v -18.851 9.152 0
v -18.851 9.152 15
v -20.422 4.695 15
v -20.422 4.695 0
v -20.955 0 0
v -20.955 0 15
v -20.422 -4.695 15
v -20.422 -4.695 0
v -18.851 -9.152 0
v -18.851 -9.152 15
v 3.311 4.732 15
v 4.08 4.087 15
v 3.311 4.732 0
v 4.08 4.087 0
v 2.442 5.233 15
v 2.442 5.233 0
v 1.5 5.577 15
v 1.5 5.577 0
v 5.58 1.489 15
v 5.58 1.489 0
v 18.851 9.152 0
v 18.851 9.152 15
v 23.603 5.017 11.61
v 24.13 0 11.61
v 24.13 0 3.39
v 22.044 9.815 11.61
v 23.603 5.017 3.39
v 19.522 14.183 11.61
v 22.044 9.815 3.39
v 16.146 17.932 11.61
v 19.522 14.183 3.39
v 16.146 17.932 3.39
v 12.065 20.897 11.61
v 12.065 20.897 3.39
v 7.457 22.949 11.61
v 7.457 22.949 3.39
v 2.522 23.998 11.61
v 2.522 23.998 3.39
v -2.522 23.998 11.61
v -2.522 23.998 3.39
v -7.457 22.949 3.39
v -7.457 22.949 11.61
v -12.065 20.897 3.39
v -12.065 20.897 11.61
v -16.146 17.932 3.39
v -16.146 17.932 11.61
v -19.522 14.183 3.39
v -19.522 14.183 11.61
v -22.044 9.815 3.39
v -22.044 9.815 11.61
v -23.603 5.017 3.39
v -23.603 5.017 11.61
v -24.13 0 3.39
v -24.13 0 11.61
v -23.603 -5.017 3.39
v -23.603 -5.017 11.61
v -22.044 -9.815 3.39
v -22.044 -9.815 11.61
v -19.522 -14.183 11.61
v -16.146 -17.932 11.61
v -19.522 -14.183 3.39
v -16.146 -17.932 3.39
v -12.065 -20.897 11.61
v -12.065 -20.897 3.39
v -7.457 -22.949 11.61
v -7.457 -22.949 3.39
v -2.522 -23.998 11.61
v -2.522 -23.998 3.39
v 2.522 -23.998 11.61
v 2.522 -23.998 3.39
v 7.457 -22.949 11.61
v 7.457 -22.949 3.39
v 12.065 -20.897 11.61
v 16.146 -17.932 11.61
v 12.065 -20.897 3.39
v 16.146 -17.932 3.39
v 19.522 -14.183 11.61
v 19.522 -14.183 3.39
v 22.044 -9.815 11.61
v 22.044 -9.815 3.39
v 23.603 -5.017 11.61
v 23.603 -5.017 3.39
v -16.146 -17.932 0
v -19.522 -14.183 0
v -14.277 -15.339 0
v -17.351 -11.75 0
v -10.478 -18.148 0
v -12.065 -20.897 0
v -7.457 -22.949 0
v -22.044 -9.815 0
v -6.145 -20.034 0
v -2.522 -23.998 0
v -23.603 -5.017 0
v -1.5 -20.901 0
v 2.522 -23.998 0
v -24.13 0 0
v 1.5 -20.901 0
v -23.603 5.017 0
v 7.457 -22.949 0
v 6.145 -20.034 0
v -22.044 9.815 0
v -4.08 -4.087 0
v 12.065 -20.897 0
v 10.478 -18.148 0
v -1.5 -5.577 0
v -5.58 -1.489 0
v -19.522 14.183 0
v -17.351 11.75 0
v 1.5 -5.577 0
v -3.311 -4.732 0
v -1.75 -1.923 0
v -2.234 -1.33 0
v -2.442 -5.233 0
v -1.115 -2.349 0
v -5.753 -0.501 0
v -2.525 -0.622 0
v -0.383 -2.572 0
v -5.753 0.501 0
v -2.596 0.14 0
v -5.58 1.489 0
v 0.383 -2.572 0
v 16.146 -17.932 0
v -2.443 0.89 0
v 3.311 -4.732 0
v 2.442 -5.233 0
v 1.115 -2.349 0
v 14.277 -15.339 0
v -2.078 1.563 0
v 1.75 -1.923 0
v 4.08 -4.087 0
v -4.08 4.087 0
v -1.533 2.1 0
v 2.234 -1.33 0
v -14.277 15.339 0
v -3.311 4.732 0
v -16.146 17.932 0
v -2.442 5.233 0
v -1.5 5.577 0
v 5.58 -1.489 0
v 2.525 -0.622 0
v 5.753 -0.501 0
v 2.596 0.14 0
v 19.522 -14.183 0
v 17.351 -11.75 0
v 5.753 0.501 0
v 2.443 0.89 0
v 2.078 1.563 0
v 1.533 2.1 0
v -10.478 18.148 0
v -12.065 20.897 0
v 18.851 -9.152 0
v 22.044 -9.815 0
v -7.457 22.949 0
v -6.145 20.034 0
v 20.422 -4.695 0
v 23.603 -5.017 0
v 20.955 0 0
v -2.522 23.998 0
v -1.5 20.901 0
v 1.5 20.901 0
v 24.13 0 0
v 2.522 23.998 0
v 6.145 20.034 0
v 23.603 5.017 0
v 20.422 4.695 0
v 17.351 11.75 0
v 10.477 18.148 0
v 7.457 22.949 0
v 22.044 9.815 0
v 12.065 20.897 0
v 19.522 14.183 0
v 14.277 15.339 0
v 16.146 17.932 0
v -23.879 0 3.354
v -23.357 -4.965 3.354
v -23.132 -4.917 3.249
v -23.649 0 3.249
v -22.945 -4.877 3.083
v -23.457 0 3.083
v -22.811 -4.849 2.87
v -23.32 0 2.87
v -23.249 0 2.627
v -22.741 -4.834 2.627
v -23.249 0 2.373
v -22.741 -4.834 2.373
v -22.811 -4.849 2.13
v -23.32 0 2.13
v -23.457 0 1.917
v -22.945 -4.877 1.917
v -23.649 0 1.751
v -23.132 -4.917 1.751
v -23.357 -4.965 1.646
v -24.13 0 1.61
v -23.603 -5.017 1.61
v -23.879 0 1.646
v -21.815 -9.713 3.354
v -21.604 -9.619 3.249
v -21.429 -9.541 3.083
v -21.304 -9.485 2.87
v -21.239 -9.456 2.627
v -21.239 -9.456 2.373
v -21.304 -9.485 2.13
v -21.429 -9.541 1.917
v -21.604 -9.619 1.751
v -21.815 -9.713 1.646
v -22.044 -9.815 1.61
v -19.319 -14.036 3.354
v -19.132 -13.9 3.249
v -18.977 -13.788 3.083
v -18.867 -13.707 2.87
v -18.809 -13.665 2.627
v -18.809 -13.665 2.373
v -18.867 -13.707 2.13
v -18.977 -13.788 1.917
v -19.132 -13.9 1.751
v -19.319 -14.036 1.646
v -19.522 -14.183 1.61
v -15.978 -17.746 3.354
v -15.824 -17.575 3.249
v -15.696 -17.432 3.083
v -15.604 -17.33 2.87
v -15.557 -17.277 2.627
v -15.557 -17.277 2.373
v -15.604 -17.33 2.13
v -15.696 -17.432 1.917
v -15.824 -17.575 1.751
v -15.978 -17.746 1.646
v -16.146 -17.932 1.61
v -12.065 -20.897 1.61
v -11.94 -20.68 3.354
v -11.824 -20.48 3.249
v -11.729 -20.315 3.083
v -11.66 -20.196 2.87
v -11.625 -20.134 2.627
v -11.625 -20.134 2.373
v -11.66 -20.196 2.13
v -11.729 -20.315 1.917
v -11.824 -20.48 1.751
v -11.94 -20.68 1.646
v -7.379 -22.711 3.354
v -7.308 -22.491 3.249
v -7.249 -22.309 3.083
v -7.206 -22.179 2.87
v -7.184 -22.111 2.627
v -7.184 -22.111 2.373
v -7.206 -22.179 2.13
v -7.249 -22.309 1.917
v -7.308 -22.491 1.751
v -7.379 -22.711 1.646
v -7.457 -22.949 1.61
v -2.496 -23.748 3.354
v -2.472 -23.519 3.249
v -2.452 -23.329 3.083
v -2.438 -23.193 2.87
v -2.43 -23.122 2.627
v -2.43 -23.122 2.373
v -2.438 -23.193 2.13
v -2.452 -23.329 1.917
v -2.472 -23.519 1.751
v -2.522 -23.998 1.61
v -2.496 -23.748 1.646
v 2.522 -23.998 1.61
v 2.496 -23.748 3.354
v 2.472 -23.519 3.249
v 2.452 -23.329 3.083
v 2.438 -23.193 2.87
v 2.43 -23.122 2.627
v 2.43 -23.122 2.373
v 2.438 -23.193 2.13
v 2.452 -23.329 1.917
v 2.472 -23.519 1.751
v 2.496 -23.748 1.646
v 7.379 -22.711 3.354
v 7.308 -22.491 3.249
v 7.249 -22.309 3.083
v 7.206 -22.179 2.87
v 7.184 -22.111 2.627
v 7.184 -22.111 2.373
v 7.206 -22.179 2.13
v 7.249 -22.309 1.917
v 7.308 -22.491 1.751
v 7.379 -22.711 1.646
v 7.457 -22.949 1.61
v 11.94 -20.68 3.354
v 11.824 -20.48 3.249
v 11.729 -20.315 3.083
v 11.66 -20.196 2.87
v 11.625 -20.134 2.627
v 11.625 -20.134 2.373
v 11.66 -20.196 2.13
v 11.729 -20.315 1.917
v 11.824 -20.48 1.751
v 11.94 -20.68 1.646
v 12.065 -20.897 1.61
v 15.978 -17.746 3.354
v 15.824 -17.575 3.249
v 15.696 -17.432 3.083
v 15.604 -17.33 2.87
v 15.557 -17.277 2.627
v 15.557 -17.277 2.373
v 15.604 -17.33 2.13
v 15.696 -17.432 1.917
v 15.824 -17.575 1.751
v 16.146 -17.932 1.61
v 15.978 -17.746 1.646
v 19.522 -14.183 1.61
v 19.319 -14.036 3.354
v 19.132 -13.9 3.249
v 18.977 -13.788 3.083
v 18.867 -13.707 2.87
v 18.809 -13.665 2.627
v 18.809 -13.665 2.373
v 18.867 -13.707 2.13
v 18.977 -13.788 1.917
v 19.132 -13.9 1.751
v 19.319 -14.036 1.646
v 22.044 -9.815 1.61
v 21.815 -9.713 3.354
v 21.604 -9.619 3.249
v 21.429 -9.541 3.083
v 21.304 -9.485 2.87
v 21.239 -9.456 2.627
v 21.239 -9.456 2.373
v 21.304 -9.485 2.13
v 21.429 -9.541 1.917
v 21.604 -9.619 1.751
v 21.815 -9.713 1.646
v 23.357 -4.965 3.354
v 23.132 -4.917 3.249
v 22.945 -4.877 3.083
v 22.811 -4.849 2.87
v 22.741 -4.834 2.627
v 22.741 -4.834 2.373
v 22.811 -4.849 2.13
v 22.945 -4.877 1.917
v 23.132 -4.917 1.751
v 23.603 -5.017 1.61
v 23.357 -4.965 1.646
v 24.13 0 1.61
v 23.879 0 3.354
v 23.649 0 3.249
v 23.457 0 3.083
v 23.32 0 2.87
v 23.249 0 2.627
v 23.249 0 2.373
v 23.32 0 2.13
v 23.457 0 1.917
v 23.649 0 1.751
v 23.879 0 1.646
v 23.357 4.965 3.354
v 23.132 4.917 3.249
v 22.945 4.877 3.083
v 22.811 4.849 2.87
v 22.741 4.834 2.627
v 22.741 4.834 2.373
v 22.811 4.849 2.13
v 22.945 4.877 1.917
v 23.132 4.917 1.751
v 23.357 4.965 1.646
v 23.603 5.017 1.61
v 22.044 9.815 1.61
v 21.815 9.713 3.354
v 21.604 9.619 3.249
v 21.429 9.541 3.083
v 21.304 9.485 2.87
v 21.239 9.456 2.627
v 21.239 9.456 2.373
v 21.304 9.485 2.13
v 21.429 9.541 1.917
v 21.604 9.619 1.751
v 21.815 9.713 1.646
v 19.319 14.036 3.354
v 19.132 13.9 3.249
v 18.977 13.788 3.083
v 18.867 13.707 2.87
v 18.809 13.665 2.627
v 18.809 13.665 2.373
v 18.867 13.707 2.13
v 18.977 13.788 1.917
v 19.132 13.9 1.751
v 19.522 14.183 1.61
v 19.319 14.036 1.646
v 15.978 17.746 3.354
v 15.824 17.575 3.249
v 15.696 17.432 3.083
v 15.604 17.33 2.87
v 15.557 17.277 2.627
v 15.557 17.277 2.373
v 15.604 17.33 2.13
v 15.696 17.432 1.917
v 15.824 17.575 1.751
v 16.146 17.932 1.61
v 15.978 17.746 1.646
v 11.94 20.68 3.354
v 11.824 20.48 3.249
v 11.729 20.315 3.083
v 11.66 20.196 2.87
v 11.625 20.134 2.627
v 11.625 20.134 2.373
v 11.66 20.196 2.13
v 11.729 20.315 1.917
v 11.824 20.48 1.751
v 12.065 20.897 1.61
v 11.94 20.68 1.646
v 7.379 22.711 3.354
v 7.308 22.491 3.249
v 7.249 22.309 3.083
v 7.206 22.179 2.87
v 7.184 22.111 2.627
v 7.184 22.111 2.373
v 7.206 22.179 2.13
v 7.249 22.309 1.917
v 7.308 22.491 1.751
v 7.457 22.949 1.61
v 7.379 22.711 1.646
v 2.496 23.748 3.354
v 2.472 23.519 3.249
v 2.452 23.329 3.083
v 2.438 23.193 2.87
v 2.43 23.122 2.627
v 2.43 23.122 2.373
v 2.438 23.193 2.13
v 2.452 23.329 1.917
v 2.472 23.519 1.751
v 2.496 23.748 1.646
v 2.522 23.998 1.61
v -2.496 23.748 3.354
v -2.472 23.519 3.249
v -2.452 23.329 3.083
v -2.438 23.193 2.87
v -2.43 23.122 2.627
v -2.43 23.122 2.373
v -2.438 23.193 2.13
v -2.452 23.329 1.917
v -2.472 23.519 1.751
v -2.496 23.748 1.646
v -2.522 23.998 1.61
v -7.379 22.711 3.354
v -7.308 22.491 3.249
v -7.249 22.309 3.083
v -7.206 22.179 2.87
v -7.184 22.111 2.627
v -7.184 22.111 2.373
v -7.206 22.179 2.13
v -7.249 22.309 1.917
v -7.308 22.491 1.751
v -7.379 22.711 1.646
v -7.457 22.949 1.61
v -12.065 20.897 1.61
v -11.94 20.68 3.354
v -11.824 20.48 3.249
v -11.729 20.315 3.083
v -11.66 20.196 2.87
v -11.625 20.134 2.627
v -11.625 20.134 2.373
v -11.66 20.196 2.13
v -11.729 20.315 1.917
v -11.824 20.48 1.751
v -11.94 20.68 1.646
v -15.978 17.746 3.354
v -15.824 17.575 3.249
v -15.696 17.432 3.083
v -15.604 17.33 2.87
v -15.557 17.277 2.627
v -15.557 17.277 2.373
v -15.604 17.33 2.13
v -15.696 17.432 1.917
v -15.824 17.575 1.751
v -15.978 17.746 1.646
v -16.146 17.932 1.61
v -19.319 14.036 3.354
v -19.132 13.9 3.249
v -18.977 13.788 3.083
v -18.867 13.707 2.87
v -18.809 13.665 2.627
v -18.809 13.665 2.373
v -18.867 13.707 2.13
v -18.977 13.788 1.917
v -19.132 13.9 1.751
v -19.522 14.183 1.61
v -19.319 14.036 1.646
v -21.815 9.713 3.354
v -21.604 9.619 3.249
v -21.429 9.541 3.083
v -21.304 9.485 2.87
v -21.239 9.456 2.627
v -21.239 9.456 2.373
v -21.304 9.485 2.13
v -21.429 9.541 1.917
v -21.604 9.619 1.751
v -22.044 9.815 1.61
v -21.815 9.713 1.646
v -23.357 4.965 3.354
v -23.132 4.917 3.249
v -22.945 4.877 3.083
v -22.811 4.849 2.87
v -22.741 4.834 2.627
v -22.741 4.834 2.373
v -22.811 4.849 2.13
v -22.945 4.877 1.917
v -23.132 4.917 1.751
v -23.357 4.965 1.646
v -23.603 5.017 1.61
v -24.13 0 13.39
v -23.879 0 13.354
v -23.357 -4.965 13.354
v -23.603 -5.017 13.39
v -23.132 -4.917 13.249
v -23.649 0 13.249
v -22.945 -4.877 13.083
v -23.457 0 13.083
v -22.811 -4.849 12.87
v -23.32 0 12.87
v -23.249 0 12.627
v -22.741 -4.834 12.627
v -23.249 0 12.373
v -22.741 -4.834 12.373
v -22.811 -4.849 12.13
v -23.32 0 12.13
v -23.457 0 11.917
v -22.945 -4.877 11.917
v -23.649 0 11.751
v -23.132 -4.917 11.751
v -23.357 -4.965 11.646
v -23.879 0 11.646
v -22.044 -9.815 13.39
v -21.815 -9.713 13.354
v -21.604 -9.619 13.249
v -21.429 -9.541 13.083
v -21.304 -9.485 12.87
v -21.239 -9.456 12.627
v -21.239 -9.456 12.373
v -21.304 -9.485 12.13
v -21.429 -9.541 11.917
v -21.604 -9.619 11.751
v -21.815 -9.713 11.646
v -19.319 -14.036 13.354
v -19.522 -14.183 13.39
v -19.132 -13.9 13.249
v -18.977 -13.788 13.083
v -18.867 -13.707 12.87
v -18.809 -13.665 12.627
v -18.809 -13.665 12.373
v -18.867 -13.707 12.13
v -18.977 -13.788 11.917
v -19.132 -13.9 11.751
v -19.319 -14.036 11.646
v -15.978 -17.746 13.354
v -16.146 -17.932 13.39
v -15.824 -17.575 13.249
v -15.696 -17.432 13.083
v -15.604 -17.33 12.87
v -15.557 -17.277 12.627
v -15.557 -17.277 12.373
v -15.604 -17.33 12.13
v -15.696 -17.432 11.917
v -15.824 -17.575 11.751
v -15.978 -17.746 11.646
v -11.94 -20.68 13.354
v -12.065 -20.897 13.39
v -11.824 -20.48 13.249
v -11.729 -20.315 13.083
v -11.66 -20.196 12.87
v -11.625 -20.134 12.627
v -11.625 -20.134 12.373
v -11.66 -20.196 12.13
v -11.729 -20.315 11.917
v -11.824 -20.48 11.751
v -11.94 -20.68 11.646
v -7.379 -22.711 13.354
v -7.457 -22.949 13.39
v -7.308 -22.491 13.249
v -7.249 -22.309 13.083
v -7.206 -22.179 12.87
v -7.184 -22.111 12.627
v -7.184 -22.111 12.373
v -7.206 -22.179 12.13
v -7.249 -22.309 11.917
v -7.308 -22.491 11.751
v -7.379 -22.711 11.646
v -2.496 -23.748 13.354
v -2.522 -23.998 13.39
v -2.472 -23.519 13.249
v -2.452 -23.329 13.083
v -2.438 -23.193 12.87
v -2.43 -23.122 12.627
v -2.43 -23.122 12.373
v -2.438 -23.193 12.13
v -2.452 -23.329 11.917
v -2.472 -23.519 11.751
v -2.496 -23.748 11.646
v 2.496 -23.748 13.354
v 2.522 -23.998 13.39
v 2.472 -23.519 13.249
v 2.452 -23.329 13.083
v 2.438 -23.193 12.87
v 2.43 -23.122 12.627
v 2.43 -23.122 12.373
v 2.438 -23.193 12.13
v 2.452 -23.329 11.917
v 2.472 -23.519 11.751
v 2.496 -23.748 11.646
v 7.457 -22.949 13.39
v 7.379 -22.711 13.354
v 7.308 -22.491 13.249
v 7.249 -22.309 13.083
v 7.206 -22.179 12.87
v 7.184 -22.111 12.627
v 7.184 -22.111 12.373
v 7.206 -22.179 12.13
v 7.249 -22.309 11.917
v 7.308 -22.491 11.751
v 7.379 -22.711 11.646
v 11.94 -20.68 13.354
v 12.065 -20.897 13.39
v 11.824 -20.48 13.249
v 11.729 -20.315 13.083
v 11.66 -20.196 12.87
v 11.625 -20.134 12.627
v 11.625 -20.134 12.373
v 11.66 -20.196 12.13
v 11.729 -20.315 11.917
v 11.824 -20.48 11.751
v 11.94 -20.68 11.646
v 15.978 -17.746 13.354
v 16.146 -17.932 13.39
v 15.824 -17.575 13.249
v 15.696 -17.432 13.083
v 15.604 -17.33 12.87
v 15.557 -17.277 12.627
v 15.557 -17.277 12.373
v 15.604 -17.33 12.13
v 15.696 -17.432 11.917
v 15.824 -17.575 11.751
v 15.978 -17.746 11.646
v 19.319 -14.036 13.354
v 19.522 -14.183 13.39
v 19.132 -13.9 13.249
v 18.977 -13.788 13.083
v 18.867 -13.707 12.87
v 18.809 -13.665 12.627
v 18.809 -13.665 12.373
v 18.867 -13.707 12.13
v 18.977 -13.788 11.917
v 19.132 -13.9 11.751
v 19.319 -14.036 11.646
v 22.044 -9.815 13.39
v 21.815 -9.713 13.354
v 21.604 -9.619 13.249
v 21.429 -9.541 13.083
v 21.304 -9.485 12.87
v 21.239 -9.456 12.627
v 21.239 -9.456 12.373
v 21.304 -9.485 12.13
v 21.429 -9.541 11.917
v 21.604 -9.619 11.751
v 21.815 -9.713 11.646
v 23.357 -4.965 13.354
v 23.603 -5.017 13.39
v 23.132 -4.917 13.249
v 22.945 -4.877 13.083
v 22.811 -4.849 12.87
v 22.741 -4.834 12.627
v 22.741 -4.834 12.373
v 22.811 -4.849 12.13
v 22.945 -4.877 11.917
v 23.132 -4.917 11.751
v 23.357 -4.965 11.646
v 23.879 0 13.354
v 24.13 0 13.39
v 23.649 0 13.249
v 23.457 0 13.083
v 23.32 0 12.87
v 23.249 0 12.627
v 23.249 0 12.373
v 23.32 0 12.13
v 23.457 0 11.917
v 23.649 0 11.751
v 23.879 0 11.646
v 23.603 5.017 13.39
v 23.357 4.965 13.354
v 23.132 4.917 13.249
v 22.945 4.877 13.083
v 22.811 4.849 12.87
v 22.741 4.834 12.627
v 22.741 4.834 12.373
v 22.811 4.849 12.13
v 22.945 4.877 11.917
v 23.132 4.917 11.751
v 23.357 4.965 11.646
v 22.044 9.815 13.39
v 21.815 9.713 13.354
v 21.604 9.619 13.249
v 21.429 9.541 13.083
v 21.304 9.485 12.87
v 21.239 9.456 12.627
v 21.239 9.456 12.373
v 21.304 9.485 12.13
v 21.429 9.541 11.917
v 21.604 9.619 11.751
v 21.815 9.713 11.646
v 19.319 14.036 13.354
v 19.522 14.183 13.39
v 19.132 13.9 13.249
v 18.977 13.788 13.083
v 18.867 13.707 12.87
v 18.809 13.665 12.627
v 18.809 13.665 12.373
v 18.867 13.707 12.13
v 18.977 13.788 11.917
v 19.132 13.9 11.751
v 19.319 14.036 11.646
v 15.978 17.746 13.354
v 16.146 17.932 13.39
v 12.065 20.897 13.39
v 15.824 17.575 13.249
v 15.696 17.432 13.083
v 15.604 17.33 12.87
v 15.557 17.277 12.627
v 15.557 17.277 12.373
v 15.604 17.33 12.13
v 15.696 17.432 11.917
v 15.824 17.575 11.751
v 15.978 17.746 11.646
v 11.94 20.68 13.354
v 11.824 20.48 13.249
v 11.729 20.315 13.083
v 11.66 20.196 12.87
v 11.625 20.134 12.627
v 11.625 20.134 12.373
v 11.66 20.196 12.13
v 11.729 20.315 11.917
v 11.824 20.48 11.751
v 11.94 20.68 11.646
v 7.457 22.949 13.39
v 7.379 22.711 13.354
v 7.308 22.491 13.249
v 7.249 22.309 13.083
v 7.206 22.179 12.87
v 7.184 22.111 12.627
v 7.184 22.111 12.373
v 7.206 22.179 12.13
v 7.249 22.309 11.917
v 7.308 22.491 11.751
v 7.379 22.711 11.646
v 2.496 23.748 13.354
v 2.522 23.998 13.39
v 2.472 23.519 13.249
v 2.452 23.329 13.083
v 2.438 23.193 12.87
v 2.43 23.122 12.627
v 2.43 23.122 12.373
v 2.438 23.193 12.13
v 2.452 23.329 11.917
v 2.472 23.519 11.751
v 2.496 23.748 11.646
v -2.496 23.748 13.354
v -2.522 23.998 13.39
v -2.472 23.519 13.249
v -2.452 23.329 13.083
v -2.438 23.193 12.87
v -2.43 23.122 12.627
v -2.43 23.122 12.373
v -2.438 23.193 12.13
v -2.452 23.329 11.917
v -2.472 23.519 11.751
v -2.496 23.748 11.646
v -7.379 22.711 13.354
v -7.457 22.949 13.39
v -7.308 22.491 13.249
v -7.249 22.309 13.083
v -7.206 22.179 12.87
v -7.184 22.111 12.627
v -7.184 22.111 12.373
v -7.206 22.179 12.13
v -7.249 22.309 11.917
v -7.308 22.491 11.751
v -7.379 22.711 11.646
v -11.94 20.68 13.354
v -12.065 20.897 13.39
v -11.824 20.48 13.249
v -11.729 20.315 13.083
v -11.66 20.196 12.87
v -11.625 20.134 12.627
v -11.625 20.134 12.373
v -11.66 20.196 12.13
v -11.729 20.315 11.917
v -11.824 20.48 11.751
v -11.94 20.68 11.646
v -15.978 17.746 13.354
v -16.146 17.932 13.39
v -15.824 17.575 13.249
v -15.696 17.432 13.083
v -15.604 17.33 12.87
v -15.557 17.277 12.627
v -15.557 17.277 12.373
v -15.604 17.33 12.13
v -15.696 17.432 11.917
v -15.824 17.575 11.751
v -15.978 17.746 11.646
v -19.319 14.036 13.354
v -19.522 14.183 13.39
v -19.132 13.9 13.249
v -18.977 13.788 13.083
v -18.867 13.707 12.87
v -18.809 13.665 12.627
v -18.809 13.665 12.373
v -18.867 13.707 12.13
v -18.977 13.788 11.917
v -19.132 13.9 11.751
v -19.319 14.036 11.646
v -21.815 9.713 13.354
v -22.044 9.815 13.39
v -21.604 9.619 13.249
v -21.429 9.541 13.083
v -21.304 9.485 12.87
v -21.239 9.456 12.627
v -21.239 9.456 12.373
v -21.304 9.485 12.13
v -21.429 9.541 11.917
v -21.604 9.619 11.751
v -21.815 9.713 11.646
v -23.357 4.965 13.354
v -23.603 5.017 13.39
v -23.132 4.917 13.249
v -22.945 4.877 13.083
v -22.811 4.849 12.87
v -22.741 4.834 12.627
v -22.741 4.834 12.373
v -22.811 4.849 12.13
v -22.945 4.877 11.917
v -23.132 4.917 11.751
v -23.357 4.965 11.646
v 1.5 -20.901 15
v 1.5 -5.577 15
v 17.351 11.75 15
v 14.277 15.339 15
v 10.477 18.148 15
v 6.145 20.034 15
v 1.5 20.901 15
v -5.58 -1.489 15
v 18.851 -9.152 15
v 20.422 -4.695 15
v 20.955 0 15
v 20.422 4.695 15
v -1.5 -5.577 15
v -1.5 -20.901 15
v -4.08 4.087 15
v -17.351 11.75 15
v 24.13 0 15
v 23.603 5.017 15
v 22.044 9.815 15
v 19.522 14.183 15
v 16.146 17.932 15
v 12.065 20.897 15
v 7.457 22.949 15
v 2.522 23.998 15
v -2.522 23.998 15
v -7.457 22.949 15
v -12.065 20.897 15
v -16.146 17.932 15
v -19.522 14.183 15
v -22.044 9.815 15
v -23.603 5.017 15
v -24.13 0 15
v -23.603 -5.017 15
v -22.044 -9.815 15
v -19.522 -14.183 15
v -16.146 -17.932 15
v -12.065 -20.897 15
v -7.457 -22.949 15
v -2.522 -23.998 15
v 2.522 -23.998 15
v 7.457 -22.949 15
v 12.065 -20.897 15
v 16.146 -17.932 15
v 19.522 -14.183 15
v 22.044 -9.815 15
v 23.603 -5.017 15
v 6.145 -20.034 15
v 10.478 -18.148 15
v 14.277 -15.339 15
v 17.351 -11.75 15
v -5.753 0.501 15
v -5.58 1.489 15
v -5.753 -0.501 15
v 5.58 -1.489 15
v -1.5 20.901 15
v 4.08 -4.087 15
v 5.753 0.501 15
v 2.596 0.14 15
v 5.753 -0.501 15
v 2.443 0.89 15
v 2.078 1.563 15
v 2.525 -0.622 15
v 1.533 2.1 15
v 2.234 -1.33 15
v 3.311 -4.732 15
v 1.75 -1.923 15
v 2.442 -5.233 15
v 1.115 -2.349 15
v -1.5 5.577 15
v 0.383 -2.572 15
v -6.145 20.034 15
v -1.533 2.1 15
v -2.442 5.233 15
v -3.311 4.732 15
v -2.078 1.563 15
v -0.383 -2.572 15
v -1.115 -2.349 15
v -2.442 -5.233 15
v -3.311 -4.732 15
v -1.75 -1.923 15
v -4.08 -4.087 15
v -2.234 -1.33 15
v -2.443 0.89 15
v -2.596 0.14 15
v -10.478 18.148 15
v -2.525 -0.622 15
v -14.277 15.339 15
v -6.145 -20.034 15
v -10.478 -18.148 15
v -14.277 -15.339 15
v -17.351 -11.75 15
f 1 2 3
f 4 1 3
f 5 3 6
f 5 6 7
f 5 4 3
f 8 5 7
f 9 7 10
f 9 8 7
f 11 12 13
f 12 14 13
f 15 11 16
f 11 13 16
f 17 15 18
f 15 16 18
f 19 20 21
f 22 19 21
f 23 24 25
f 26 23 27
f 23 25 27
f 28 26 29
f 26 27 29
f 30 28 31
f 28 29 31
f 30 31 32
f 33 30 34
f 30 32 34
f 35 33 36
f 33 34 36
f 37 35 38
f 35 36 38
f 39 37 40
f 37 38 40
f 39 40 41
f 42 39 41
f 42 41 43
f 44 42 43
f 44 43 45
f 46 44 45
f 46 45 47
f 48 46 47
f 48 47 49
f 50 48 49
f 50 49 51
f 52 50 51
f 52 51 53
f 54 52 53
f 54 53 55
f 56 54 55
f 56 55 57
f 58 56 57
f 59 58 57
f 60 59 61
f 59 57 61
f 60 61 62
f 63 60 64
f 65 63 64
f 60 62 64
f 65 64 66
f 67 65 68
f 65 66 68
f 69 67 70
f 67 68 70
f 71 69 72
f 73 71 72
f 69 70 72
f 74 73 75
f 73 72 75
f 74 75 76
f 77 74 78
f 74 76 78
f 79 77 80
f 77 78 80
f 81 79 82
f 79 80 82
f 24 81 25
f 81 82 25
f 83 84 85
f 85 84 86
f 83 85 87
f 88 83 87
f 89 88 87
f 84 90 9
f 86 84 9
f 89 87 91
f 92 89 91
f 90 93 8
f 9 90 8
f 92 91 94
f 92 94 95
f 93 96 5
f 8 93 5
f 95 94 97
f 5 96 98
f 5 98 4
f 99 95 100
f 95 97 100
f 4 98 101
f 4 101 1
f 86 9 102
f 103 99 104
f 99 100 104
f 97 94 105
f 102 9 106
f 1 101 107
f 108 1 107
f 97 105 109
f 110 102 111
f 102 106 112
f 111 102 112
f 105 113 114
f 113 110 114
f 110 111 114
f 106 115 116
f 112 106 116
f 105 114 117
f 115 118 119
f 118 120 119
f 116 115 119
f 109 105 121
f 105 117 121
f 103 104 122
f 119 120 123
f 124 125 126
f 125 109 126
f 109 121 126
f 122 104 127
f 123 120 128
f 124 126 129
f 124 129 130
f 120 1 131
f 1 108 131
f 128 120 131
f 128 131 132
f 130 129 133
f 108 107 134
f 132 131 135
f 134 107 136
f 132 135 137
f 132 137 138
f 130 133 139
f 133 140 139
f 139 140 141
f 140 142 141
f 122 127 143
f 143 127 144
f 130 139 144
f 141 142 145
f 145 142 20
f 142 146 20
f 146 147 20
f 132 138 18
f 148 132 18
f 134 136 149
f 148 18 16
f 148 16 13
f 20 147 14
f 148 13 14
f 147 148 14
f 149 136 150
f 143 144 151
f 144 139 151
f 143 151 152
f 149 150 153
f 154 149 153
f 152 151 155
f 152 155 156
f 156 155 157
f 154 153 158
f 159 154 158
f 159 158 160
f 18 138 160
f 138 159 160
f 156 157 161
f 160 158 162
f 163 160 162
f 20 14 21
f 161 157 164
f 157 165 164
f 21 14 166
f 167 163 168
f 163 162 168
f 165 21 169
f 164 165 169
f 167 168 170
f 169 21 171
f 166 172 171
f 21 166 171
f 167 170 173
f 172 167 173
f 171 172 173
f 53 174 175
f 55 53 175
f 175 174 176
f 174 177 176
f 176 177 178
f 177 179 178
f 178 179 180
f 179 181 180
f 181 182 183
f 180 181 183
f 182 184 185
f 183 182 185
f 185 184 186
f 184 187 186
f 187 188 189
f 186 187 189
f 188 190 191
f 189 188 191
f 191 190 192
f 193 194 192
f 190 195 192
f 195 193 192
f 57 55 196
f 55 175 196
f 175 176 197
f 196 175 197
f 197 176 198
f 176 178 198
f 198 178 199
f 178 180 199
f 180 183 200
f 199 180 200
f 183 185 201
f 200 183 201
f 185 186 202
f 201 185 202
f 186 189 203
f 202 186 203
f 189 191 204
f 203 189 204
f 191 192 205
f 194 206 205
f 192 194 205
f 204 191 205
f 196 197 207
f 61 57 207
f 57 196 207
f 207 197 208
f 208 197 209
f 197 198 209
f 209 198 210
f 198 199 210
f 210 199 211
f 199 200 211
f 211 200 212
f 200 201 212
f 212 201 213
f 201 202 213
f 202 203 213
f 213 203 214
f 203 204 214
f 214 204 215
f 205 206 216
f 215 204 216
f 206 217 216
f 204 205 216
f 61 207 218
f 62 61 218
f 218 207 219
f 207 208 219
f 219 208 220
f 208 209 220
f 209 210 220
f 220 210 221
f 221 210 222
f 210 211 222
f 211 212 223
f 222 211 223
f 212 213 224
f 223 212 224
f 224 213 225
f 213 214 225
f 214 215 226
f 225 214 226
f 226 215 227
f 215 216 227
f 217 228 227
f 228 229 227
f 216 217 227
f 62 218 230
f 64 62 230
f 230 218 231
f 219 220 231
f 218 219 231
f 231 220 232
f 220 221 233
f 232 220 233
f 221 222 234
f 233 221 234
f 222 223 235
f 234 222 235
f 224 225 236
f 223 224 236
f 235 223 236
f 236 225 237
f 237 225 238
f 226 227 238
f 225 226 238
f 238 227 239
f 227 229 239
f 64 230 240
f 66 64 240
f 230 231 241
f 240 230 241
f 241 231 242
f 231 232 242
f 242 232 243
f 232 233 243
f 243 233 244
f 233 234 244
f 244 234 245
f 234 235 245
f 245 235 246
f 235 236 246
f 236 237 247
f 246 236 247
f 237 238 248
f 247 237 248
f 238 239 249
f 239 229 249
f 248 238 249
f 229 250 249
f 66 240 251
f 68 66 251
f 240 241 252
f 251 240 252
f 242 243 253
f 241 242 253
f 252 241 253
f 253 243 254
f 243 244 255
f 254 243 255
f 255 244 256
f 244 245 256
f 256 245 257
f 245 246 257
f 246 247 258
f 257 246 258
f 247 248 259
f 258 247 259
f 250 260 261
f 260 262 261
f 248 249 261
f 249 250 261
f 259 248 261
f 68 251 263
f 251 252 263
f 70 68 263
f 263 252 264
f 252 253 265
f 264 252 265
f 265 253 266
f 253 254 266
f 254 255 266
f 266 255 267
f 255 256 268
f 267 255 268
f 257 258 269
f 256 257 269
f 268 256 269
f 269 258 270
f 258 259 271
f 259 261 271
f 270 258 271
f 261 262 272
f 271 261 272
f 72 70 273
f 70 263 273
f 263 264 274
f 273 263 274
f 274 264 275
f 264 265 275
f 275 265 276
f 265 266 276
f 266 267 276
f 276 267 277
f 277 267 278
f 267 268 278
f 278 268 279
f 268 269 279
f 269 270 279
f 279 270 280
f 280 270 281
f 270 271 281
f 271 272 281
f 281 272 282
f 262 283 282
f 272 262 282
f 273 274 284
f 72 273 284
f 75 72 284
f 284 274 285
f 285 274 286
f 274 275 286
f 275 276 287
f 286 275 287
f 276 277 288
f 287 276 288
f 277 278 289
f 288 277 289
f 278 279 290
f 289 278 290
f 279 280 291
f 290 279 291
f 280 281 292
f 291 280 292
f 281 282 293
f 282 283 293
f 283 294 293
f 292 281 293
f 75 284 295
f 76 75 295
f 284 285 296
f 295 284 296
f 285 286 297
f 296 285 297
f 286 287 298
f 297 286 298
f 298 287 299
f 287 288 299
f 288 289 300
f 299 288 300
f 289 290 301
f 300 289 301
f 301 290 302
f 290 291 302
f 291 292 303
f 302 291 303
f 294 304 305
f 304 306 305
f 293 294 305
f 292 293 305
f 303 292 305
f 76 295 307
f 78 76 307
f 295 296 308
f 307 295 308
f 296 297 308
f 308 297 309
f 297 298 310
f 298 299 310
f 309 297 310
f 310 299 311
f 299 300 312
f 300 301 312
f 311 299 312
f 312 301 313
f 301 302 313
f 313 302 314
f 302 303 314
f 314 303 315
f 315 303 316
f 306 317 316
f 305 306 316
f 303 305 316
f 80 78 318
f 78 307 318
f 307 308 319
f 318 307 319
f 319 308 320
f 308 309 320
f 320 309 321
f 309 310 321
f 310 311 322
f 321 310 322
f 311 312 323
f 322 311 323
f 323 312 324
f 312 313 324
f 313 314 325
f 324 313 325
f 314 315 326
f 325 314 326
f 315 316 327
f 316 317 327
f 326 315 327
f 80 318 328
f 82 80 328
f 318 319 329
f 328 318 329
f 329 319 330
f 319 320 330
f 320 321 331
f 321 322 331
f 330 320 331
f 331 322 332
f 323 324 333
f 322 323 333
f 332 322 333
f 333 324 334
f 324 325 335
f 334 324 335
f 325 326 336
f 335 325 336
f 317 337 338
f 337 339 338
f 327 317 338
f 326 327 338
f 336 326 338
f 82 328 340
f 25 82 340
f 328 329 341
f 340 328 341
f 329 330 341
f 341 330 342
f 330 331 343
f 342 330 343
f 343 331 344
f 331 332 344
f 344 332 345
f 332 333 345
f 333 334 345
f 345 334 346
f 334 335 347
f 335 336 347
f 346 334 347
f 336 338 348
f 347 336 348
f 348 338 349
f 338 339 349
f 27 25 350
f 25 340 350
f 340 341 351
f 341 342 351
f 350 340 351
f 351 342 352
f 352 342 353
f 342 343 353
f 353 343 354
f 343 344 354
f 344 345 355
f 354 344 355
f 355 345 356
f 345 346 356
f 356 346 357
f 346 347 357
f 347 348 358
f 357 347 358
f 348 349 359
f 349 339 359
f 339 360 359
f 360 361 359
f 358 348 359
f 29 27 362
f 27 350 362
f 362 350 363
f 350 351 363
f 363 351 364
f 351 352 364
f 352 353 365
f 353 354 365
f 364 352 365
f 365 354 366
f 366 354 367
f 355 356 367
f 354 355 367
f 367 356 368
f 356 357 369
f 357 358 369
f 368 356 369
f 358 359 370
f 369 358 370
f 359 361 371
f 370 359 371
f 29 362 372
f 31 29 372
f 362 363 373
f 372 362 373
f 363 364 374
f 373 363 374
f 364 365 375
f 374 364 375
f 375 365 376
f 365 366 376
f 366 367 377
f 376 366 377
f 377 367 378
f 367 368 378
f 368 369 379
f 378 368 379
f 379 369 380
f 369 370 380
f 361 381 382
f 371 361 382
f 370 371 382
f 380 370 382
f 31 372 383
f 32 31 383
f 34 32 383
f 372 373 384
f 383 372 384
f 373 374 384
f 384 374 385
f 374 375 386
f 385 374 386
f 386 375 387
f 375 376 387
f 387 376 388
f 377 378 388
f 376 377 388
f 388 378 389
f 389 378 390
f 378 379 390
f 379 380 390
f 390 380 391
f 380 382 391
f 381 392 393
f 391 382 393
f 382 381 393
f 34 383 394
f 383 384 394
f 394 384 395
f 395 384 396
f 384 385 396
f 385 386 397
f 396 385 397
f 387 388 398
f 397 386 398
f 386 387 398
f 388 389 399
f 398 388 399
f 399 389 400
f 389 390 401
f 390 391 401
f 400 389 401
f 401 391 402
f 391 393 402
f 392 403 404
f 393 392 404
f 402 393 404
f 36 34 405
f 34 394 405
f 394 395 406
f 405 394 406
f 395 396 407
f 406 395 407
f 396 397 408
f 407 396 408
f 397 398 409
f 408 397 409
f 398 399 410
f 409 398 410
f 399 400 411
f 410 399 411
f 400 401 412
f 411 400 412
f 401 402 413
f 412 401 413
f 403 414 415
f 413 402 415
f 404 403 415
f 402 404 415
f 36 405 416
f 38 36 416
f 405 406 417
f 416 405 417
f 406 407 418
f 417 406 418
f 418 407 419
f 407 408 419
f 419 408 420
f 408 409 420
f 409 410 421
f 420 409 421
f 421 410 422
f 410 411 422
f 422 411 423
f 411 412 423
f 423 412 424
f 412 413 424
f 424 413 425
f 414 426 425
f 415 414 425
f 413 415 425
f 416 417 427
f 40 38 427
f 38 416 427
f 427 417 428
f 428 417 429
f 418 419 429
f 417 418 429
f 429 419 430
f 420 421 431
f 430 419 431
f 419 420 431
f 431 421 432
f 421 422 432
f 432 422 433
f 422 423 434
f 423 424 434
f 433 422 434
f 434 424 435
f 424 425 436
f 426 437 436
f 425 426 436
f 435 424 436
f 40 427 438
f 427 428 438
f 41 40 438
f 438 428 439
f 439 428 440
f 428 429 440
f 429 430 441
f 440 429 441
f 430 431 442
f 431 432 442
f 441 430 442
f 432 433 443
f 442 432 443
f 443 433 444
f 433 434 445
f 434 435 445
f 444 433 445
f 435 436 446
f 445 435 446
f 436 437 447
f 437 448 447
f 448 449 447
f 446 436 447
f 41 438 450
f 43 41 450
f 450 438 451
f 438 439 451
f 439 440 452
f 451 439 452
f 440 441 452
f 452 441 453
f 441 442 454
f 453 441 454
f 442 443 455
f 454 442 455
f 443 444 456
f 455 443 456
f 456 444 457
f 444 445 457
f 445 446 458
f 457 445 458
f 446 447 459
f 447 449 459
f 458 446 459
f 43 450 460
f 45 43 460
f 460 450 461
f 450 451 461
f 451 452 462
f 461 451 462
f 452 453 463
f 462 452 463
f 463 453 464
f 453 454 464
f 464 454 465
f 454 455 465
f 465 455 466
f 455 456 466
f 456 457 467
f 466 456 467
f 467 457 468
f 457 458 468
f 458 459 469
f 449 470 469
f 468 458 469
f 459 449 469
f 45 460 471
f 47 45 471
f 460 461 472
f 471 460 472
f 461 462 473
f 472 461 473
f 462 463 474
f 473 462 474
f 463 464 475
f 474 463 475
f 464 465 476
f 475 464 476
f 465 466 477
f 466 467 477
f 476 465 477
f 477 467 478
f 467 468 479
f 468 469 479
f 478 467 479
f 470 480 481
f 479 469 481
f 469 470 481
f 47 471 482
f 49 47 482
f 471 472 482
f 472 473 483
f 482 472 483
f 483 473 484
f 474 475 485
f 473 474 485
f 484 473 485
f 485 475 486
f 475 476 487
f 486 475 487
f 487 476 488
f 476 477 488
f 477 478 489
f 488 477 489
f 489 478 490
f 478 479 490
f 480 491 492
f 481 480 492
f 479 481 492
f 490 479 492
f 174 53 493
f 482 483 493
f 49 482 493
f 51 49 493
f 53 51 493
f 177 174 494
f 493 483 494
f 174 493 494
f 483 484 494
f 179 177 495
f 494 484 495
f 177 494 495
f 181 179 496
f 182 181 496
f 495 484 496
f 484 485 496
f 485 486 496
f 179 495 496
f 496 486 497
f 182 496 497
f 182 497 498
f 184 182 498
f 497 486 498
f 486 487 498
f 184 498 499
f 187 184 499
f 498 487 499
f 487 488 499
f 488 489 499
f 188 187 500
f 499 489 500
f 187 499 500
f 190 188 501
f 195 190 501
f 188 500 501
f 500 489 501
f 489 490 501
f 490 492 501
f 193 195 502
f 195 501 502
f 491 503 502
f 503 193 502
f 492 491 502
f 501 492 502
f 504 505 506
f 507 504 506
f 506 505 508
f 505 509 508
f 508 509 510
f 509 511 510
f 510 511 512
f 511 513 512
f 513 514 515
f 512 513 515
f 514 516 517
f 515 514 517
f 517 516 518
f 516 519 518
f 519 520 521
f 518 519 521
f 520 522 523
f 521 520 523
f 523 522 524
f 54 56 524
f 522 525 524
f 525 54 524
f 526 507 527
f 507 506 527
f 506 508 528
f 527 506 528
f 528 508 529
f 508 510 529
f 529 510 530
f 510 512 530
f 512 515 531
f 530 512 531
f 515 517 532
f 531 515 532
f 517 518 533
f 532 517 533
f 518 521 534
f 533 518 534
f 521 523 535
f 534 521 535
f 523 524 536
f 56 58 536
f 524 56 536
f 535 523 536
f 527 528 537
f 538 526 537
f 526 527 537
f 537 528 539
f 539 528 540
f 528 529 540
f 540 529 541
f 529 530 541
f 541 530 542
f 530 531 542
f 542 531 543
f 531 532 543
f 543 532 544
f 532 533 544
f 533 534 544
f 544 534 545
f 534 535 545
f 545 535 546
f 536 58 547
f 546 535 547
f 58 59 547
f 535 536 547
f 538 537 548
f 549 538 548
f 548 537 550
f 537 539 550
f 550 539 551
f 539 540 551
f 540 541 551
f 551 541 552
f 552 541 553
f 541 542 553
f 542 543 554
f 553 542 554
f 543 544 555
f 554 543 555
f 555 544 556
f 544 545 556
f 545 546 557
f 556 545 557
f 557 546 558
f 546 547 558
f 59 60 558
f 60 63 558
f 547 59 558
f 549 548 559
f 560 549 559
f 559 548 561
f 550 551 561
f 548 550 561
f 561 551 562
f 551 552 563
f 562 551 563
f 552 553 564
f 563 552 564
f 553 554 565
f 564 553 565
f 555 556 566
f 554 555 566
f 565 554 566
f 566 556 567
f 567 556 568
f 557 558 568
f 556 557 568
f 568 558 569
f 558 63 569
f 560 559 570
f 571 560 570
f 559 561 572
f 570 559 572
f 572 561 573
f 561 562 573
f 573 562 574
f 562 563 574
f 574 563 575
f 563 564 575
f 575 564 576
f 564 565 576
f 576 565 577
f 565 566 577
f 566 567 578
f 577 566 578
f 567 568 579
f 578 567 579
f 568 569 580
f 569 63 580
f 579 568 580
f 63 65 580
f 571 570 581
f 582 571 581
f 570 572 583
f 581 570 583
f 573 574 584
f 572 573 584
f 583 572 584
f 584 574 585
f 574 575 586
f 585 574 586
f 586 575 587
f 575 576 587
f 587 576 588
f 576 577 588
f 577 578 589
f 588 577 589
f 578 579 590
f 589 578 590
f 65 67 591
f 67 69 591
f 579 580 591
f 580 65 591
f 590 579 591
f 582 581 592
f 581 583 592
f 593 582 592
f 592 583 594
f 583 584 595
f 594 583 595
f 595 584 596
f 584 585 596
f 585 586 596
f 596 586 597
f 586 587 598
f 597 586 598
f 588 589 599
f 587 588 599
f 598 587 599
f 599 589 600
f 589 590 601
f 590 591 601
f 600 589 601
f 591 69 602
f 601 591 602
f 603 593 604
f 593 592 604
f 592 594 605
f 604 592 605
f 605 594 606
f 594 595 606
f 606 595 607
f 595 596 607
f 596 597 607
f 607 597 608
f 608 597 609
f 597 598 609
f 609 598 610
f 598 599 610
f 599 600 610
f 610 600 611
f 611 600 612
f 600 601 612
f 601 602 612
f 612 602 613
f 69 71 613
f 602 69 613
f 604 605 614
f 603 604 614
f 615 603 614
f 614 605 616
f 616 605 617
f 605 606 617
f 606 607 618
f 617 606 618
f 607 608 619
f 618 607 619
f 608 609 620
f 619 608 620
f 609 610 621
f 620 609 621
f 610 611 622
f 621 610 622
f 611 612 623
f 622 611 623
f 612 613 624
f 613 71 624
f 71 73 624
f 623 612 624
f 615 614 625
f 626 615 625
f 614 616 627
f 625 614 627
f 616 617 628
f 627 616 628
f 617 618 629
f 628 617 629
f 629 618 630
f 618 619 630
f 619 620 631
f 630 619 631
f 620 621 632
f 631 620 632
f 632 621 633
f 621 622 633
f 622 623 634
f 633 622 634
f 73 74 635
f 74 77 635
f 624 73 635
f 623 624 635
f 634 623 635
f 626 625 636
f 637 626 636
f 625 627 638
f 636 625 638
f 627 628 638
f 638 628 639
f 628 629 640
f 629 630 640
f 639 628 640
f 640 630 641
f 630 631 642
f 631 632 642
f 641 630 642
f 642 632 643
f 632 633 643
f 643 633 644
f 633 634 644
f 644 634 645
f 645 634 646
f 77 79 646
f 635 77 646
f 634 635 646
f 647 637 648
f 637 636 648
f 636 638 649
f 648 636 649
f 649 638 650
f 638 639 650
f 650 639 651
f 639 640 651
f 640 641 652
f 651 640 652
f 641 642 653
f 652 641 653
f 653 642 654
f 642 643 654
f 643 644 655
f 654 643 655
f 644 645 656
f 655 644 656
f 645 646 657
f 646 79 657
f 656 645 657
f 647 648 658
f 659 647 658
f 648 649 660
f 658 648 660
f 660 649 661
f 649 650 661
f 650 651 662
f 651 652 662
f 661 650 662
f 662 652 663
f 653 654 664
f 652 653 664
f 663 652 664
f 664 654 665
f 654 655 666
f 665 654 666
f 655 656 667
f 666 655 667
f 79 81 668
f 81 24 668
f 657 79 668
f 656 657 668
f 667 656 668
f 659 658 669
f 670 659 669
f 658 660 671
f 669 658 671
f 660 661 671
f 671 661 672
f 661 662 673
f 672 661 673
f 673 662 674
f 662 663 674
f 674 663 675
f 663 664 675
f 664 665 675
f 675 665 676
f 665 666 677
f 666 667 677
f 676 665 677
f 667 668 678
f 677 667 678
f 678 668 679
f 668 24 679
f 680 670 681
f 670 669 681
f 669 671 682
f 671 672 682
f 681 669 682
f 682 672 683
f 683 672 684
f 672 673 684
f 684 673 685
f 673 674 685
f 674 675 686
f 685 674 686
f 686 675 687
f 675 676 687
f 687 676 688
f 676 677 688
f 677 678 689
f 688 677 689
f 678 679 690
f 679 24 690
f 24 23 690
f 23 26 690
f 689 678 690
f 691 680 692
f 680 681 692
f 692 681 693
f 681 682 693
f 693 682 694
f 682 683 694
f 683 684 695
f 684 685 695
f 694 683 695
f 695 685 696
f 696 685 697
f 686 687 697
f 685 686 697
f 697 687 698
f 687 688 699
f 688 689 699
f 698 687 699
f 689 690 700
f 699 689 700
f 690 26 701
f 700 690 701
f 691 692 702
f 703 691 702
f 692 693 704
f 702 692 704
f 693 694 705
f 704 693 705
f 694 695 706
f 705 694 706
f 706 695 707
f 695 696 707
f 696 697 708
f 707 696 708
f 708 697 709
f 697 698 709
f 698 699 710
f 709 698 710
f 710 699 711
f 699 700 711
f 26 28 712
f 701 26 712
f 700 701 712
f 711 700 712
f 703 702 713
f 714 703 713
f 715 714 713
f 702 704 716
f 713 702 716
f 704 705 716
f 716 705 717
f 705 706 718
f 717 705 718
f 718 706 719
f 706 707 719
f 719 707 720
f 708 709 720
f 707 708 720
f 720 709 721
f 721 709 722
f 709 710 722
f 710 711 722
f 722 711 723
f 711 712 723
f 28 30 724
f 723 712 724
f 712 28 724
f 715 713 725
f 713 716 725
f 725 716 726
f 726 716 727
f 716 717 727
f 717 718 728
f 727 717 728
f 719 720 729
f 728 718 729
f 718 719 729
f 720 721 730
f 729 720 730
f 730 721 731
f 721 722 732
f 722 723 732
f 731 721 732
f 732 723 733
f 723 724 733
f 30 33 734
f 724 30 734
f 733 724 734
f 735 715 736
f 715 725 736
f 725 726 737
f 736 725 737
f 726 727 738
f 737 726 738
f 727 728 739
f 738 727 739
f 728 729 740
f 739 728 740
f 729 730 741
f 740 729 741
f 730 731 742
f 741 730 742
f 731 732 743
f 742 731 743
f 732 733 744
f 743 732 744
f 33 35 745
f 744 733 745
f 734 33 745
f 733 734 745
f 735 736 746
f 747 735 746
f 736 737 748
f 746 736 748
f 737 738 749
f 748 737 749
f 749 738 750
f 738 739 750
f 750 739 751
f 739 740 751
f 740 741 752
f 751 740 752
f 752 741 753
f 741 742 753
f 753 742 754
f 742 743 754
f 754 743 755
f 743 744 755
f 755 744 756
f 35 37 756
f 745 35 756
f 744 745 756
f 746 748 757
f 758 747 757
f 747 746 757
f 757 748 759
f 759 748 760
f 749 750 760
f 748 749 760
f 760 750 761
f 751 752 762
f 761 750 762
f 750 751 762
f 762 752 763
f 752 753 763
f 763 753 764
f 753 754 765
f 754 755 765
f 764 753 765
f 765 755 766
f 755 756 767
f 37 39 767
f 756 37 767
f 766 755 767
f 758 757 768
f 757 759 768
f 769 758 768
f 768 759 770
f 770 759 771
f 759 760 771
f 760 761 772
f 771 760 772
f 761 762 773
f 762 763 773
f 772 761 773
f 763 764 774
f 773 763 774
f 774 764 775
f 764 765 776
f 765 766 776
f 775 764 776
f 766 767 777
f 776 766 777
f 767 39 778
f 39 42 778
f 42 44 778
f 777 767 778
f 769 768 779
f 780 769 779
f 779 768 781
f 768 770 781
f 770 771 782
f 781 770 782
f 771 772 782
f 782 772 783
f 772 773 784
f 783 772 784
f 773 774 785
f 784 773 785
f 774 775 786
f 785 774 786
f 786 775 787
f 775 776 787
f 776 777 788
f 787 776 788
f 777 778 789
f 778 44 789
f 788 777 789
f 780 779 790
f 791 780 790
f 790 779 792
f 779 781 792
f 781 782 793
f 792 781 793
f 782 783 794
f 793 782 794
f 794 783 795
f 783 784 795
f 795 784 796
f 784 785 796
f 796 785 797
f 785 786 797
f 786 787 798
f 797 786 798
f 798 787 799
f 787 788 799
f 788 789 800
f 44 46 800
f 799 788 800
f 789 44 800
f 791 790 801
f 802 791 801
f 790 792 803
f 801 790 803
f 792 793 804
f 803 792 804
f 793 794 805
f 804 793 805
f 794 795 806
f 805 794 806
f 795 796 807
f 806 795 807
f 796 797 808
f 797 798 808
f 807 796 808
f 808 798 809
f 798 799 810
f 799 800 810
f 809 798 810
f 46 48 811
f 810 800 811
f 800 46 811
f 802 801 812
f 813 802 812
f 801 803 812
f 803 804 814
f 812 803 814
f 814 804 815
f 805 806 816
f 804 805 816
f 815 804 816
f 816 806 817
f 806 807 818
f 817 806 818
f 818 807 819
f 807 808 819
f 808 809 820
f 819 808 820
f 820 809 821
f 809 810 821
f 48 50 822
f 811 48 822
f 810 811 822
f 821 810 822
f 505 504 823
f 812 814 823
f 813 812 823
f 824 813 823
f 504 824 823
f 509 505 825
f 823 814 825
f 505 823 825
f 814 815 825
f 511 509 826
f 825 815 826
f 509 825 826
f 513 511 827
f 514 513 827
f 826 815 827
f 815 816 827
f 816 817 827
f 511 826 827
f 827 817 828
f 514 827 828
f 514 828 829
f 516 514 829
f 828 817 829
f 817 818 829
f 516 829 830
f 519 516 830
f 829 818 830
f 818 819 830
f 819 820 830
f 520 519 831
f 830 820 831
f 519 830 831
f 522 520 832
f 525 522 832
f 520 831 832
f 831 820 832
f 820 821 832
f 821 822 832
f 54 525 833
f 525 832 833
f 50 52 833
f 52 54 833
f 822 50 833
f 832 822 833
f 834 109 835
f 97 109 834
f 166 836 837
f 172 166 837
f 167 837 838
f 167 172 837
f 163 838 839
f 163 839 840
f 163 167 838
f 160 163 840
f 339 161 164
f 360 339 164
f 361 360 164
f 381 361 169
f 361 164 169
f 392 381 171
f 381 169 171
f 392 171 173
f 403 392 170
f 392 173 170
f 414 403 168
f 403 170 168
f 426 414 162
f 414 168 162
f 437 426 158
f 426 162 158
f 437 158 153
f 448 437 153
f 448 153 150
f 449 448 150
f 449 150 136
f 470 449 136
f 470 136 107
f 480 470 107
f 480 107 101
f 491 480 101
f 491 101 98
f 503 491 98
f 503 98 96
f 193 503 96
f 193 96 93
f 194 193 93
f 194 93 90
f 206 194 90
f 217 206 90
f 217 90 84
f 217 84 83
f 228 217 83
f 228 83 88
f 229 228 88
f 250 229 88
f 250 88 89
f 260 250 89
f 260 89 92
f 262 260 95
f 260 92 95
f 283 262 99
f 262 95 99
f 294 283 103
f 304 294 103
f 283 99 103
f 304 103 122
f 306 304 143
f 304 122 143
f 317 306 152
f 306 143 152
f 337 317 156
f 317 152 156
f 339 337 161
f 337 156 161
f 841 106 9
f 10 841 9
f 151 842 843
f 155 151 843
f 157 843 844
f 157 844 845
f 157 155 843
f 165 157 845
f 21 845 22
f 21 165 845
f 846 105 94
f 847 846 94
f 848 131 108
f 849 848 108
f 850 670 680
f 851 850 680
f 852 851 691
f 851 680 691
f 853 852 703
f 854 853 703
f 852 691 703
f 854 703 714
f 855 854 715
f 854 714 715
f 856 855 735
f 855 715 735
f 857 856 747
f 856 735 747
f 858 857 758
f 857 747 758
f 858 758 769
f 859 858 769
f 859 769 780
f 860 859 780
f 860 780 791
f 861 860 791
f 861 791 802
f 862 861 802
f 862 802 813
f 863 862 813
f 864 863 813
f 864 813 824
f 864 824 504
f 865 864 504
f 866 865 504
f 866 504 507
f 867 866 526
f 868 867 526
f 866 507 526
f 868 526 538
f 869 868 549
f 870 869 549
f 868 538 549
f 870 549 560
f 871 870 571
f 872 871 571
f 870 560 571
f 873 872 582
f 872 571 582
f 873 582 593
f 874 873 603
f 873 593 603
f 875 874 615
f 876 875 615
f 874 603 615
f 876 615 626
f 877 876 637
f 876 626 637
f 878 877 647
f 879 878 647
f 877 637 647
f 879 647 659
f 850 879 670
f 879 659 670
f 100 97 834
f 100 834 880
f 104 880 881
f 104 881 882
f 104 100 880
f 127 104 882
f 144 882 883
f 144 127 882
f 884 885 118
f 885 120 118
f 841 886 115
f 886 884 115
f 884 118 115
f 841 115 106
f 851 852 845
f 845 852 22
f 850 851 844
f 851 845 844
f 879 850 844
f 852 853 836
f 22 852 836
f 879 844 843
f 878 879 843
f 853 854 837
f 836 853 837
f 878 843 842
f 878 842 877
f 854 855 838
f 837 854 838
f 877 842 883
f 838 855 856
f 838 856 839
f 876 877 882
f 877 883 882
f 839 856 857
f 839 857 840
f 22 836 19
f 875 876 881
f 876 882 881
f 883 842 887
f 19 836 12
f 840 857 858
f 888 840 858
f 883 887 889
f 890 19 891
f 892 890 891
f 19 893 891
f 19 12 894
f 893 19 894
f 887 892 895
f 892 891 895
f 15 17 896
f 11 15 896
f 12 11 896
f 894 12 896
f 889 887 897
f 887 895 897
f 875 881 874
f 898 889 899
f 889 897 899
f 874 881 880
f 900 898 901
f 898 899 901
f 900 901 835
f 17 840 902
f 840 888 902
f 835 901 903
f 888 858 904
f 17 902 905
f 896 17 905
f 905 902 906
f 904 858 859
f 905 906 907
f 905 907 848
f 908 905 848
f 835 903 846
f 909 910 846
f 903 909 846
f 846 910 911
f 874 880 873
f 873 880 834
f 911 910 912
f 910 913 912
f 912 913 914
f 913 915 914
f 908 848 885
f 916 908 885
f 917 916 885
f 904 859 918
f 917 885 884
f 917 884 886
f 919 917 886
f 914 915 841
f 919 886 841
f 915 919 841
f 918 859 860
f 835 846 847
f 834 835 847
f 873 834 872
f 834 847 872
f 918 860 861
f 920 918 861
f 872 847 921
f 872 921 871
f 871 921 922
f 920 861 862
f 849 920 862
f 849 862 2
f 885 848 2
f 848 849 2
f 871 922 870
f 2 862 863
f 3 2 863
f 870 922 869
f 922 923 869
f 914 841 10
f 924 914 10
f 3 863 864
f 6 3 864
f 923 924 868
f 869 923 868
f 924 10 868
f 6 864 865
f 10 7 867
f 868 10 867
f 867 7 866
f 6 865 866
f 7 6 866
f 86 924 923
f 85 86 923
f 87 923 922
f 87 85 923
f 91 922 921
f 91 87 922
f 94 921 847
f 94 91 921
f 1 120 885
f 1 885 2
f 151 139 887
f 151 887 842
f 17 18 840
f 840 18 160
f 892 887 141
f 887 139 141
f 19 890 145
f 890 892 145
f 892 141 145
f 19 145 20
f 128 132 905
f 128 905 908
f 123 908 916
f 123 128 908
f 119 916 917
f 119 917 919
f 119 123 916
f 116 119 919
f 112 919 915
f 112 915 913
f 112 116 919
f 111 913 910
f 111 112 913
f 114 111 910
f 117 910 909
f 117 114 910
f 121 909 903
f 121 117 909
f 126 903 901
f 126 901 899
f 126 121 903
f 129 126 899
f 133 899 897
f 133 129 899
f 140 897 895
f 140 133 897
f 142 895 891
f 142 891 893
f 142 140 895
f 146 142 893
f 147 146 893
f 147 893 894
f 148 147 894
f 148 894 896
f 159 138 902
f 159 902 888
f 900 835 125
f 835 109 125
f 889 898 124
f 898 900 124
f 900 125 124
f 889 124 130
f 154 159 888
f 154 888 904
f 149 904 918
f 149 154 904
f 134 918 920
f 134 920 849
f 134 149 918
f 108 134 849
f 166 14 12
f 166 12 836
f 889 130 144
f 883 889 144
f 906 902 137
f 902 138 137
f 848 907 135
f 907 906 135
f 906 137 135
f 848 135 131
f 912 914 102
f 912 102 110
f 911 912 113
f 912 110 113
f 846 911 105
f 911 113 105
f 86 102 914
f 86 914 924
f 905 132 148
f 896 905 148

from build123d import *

# Parameters (mm, degrees)
SKETCH1_R             = 24.13
SKETCH1_R_2           = 20.955
BOSS_EXTRUDE1_DEPTH   = 15
SKETCH1_R_3           = 5.775
SKETCH1_R_4           = 2.6
BOSS_EXTRUDE1_2_DEPTH = 15
SKETCH3_W             = 3
SKETCH3_H             = 18.355
BOSS_EXTRUDE3_DEPTH   = 15
CIRPATTERN1_COUNT     = 6
SKETCH4_R             = 0.89
SKETCH5_W             = 5
SKETCH5_H             = 0.5
BOSS_EXTRUDE4_DEPTH   = 15


with BuildPart() as part:
    # Sketch1 → Boss-Extrude1 (new body)
    with BuildSketch(Plane.XY):
        Circle(SKETCH1_R)
        Circle(SKETCH1_R_2, mode=Mode.SUBTRACT)
    extrude(amount=BOSS_EXTRUDE1_DEPTH)



with BuildPart() as body_2:
    # Sketch1 → Boss-Extrude1 2 (new body)
    with BuildSketch(Plane.XY):
        Circle(SKETCH1_R_3)
        Circle(SKETCH1_R_4, mode=Mode.SUBTRACT)
    extrude(amount=BOSS_EXTRUDE1_2_DEPTH)


with BuildPart() as part_1:
    add(part.part)

    add(body_2.part)  # Boss-Extrude3 merges body 2
    # Sketch3 → Boss-Extrude3 (add)
    with BuildSketch(Plane(origin=(0, 0, 0), x_dir=(-1, 0, 0), z_dir=(0, 0, -1))):
        with Locations((0, 11.7775)):
            Rectangle(SKETCH3_W, SKETCH3_H)
    boss_extrude3 = extrude(amount=-BOSS_EXTRUDE3_DEPTH)

    # CirPattern1: Boss-Extrude3 ×6 about axis
    cirpattern1_axis = Axis((0, 0, 0), (0, 0, 1))
    for i in range(1, CIRPATTERN1_COUNT):
        add(boss_extrude3.rotate(cirpattern1_axis, i * 360 / CIRPATTERN1_COUNT))

    # Sketch4 → Cut-Revolve1 (revolve, cut)
    with BuildSketch(Plane(origin=(0, 0, 0), x_dir=(0, 0, -1), z_dir=(1, 0, 0)), mode=Mode.PRIVATE) as cut_revolve1_sk:
        with Locations((-12.5, 24.13)):
            Circle(SKETCH4_R)
        with Locations((-2.5, 24.13)):
            Circle(SKETCH4_R)
    revolve(cut_revolve1_sk.sketch.rotate(Axis((0, 0, 0), (0, 0, 1)), 90), axis=Axis((0, 0, 0), (0, 0, 1)), mode=Mode.SUBTRACT)

    # Sketch5 → Boss-Extrude4 (add)
    with BuildSketch(Plane.XY.offset(15)):
        with Locations((0, 2.35)):
            Rectangle(SKETCH5_W, SKETCH5_H)
    extrude(amount=-BOSS_EXTRUDE4_DEPTH)


solid = part_1.part
